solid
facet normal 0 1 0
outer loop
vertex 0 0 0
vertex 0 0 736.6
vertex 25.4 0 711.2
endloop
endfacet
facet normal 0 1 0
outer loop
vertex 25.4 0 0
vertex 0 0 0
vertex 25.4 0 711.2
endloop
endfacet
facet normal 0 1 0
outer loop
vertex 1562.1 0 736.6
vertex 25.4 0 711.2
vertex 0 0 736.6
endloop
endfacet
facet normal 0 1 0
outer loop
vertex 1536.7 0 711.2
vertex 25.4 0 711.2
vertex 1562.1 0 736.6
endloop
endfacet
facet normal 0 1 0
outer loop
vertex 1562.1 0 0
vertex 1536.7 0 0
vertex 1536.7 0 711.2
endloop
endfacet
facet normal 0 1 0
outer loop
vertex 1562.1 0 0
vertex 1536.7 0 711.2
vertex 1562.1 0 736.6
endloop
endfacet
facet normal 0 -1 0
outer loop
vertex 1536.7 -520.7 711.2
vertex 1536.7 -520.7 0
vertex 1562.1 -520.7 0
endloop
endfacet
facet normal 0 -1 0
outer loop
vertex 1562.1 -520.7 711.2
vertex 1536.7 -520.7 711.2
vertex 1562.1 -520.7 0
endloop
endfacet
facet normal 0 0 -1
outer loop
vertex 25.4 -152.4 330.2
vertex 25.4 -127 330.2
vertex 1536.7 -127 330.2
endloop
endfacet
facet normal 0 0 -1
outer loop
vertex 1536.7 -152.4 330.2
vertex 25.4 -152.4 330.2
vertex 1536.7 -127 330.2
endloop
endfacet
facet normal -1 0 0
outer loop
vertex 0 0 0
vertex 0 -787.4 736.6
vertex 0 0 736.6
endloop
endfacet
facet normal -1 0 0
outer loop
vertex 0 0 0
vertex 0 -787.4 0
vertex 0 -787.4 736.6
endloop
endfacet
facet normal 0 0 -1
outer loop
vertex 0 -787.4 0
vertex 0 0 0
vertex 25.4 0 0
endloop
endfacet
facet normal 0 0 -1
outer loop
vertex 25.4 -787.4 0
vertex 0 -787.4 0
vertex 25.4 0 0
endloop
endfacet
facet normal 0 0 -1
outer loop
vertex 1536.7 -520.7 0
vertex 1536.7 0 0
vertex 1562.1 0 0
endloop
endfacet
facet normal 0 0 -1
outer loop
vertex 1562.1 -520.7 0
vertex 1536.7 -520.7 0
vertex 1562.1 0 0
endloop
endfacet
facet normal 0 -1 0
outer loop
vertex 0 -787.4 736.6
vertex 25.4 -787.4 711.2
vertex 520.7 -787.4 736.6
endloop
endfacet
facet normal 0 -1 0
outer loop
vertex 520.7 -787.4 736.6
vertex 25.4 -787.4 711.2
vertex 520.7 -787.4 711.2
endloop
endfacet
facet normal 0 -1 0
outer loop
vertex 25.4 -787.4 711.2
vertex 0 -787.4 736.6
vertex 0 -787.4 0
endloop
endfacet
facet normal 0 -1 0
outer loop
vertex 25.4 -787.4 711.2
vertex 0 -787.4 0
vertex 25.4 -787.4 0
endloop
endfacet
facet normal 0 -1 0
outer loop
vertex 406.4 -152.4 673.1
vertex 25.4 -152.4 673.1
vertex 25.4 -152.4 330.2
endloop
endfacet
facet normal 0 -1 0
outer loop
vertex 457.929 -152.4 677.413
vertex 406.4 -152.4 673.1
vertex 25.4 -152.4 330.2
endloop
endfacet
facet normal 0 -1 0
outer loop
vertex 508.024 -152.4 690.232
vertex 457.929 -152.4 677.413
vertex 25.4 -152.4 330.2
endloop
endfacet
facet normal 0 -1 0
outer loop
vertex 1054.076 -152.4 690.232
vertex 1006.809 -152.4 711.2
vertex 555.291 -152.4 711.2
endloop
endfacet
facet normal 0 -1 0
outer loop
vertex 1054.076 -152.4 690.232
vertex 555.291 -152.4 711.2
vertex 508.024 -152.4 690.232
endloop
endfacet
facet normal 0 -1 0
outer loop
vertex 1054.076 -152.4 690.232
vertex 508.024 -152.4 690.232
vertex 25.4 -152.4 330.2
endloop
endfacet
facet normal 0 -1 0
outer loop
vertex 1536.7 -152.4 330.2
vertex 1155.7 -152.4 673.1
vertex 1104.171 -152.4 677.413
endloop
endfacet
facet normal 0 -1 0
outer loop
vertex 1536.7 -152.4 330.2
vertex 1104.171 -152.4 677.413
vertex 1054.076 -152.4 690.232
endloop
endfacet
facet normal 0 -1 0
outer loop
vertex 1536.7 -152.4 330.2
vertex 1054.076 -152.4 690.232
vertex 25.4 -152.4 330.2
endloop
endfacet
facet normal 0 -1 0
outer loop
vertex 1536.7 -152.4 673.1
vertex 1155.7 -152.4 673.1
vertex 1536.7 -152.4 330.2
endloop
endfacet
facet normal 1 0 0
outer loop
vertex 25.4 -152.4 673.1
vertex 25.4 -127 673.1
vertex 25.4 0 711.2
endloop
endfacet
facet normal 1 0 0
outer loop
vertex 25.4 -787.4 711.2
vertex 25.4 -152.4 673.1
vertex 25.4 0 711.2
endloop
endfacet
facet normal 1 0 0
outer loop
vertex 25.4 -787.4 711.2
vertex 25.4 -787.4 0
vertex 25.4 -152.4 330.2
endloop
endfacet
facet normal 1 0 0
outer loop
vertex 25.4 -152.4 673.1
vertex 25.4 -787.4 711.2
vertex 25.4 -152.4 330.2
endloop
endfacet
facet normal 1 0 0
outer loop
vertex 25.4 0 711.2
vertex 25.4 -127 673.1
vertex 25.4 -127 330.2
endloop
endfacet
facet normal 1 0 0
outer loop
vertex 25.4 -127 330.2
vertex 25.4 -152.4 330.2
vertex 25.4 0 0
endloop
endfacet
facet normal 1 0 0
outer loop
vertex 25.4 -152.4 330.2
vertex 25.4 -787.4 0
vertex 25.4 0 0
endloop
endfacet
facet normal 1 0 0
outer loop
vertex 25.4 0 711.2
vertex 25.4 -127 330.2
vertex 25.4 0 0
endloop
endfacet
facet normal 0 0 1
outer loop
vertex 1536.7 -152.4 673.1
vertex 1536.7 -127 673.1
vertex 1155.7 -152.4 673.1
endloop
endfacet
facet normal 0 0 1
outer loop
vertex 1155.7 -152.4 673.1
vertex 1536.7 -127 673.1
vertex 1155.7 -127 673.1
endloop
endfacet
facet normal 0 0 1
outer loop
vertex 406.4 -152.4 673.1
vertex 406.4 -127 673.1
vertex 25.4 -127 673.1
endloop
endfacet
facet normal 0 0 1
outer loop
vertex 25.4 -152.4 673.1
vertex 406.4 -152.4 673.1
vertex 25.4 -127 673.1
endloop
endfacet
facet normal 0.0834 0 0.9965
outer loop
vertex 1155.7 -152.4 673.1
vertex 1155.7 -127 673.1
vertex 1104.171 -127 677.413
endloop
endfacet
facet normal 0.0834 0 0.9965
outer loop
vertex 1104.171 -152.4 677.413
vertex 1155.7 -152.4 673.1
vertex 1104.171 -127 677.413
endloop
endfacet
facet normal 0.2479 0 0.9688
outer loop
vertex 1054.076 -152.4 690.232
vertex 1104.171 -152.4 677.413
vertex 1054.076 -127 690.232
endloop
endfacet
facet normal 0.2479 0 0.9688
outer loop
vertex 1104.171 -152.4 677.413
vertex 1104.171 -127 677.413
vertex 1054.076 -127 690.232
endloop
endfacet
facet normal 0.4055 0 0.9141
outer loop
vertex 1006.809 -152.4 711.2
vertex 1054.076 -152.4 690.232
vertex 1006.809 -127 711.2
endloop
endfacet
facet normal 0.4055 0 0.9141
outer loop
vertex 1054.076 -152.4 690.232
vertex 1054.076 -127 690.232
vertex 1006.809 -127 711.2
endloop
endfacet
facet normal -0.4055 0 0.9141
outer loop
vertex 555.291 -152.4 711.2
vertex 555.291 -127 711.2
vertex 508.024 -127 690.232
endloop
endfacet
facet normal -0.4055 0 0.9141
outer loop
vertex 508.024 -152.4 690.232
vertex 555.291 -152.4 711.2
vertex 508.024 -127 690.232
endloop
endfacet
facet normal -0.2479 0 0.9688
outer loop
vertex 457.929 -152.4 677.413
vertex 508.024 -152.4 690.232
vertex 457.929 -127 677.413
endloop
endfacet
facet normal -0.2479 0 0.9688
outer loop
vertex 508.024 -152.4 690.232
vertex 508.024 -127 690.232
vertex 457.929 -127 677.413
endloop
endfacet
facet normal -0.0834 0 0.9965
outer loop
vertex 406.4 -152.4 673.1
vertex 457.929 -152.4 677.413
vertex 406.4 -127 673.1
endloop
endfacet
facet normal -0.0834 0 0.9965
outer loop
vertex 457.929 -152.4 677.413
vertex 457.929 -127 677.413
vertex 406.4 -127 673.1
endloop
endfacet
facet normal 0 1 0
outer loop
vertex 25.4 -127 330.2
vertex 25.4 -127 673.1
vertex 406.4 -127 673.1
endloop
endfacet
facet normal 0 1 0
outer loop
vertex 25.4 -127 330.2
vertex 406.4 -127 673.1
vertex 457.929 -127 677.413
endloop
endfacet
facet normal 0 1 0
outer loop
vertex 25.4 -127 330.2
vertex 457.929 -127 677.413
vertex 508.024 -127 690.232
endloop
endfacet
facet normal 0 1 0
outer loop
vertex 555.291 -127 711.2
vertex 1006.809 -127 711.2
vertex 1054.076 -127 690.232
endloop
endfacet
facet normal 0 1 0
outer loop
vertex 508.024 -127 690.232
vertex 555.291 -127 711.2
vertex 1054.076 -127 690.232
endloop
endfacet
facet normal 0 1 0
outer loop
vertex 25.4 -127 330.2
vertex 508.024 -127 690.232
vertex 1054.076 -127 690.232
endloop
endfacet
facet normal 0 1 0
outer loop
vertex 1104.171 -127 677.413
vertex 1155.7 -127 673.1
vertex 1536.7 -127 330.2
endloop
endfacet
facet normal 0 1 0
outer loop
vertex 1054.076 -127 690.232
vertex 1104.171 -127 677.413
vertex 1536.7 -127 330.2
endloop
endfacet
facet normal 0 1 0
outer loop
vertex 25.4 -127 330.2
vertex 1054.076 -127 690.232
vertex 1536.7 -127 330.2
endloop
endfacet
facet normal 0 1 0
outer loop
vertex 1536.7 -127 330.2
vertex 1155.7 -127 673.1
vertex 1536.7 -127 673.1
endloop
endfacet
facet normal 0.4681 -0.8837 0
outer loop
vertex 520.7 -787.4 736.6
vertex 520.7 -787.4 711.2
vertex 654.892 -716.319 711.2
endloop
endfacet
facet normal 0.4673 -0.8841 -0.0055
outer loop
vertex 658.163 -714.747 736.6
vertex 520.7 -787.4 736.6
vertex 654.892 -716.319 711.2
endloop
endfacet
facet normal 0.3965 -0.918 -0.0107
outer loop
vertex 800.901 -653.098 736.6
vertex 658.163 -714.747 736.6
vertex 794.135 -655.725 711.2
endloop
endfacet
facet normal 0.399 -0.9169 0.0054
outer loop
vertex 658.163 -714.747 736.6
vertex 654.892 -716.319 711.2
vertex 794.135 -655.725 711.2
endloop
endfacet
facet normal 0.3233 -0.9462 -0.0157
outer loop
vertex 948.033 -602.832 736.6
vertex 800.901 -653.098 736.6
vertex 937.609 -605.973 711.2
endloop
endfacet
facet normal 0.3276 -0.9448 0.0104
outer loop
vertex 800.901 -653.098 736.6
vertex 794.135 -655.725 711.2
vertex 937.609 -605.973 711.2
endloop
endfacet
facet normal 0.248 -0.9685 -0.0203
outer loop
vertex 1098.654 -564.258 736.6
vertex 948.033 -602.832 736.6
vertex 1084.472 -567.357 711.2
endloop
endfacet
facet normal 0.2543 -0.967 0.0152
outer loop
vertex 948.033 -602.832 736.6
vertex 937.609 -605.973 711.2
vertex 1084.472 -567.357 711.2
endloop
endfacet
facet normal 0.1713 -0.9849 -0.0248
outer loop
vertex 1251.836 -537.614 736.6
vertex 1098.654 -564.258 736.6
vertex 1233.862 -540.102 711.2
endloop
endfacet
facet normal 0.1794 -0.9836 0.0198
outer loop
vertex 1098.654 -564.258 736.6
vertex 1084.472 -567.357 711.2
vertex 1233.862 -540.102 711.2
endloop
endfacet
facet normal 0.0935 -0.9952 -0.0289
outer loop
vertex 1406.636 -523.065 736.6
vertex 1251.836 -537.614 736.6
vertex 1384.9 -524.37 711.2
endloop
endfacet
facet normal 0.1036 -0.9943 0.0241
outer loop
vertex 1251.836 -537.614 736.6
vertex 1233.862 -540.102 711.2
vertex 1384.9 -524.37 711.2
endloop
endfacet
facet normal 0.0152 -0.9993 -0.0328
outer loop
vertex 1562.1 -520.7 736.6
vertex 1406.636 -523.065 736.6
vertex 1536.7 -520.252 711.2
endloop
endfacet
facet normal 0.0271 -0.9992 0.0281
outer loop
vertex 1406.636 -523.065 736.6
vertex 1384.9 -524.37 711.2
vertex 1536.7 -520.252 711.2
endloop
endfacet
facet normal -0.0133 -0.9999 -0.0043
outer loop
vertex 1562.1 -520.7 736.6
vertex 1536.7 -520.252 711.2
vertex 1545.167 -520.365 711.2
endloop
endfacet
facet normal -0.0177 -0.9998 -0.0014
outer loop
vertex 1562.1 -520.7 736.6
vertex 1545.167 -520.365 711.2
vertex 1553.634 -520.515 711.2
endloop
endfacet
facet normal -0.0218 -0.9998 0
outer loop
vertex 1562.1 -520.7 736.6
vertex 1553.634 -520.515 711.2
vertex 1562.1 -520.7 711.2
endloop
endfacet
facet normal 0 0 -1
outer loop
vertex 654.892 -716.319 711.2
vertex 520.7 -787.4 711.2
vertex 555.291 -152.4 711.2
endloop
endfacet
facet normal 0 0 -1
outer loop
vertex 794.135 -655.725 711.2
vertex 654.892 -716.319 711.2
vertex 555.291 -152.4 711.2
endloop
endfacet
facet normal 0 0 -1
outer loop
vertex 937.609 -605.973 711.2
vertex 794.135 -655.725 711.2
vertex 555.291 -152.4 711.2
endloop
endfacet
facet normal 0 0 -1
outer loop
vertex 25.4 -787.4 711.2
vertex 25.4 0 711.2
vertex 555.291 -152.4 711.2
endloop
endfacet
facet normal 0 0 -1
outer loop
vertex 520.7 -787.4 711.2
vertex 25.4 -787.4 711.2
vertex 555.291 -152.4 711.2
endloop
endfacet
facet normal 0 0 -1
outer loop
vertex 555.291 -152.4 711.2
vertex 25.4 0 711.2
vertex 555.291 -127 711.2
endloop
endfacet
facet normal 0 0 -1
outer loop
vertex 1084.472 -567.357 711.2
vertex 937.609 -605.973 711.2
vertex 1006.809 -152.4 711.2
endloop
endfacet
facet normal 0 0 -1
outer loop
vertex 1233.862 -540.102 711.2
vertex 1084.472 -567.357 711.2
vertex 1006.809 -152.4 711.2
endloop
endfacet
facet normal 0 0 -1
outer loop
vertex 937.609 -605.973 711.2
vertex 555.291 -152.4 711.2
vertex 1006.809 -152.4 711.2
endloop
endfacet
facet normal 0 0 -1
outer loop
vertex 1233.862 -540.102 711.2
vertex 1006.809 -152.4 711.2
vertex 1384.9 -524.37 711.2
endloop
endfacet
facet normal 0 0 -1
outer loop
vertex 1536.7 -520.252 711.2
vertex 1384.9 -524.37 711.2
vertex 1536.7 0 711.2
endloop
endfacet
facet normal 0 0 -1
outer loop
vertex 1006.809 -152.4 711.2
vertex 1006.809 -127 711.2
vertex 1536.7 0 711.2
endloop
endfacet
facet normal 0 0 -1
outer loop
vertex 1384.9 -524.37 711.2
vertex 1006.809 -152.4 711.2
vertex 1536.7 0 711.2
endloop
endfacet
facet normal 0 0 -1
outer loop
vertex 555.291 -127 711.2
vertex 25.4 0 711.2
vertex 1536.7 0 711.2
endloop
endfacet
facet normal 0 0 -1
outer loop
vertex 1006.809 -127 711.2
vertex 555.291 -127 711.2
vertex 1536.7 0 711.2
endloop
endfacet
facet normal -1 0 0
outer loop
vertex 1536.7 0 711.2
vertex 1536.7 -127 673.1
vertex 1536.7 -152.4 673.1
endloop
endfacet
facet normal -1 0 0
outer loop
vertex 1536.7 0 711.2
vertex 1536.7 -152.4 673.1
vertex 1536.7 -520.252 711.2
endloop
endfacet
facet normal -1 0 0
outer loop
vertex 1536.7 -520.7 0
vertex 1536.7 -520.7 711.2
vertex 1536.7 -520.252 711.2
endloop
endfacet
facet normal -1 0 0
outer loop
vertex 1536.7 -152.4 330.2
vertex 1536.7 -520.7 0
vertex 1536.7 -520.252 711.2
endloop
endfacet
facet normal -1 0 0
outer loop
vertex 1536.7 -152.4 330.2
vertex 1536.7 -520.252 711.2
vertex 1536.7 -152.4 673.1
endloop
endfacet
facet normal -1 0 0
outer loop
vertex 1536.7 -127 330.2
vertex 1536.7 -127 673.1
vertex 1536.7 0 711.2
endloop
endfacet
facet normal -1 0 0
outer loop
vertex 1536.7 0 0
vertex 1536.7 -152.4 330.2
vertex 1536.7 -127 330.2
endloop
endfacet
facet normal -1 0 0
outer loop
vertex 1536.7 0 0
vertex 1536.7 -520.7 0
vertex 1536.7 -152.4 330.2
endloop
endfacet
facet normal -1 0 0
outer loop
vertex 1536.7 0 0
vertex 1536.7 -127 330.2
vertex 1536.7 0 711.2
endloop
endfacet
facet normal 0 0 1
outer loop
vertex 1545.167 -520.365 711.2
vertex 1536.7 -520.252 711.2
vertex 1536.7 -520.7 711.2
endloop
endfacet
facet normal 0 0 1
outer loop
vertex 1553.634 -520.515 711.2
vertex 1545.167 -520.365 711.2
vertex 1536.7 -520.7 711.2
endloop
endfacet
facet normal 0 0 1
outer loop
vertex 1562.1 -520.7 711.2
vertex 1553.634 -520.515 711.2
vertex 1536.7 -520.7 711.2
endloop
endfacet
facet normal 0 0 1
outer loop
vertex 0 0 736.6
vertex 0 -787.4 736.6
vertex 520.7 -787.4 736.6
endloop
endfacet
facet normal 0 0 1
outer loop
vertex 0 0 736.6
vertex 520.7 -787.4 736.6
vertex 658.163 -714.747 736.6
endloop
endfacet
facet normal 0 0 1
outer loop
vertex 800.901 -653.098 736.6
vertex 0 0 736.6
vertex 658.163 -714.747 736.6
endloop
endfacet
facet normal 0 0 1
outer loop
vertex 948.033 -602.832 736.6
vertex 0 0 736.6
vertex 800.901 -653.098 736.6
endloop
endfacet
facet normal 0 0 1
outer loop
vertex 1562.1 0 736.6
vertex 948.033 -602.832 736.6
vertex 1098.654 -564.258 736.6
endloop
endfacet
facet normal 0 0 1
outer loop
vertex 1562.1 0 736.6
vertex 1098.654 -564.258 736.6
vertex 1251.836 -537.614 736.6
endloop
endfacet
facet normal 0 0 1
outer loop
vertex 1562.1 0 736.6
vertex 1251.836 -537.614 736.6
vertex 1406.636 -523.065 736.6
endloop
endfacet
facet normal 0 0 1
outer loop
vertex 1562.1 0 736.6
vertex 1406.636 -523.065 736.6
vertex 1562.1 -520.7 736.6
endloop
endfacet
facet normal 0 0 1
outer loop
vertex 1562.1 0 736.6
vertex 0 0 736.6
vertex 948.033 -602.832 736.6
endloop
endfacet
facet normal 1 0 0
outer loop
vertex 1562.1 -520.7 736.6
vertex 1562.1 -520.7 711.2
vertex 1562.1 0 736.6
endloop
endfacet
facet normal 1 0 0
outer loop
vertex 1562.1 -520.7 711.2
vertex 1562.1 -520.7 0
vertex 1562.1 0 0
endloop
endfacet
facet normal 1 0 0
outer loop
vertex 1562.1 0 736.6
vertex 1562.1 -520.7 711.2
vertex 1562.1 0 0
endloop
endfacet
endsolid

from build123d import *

# Parameters (mm, degrees)
F0_W     = 25.4
F0_H     = 787.4
F1_DEPTH = 711.2
F2_W     = 25.4
F2_H     = 787.4
F3_DEPTH = 25.4
F4_W     = 25.4
F4_H     = 520.7
F5_DEPTH = 711.2
F8_DEPTH = 25.4


with BuildPart() as f1:
    # F0 (on Top) → F1 (new body)
    with BuildSketch(Plane.XY):
        with Locations((12.7, -393.7)):
            Rectangle(F0_W, F0_H)
    extrude(amount=F1_DEPTH)

    # F2 (on face) → F3 (join)
    with BuildSketch(Plane.XY.offset(711.2)):
        with BuildLine():
            Line((1562.1, 0), (25.4, 0))
            Line((25.4, 0), (25.4, -787.4))
            Line((25.4, -787.4), (520.7, -787.4))
            ThreePointArc((520.7, -787.4), (1022.965212, -582.066542), (1562.1, -520.7))
            Line((1562.1, -520.7), (1562.1, 0))
        make_face()
        with Locations((12.7, -393.7)):
            Rectangle(F2_W, F2_H)
    extrude(amount=F3_DEPTH)

    # F4 (on Top) → F5 (join)
    with BuildSketch(Plane.XY):
        with Locations((1549.4, -260.35)):
            Rectangle(F4_W, F4_H)
    extrude(amount=F5_DEPTH)

    # F7 (on offset) → F8 (join)
    with BuildSketch(Plane.XZ.offset(127)):
        with BuildLine():
            Line((25.4, 673.1), (25.4, 330.2))
            Line((25.4, 330.2), (1536.7, 330.2))
            Line((1536.7, 330.2), (1536.7, 673.1))
            Line((1536.7, 673.1), (1155.7, 673.1))
            ThreePointArc((1155.7, 673.1), (1078.855779, 682.776021), (1006.809008, 711.2))
            Line((1006.809008, 711.2), (555.290992, 711.2))
            ThreePointArc((555.290992, 711.2), (483.244221, 682.776021), (406.4, 673.1))
            Line((406.4, 673.1), (25.4, 673.1))
        make_face()
    extrude(amount=F8_DEPTH)


solid = f1.part
